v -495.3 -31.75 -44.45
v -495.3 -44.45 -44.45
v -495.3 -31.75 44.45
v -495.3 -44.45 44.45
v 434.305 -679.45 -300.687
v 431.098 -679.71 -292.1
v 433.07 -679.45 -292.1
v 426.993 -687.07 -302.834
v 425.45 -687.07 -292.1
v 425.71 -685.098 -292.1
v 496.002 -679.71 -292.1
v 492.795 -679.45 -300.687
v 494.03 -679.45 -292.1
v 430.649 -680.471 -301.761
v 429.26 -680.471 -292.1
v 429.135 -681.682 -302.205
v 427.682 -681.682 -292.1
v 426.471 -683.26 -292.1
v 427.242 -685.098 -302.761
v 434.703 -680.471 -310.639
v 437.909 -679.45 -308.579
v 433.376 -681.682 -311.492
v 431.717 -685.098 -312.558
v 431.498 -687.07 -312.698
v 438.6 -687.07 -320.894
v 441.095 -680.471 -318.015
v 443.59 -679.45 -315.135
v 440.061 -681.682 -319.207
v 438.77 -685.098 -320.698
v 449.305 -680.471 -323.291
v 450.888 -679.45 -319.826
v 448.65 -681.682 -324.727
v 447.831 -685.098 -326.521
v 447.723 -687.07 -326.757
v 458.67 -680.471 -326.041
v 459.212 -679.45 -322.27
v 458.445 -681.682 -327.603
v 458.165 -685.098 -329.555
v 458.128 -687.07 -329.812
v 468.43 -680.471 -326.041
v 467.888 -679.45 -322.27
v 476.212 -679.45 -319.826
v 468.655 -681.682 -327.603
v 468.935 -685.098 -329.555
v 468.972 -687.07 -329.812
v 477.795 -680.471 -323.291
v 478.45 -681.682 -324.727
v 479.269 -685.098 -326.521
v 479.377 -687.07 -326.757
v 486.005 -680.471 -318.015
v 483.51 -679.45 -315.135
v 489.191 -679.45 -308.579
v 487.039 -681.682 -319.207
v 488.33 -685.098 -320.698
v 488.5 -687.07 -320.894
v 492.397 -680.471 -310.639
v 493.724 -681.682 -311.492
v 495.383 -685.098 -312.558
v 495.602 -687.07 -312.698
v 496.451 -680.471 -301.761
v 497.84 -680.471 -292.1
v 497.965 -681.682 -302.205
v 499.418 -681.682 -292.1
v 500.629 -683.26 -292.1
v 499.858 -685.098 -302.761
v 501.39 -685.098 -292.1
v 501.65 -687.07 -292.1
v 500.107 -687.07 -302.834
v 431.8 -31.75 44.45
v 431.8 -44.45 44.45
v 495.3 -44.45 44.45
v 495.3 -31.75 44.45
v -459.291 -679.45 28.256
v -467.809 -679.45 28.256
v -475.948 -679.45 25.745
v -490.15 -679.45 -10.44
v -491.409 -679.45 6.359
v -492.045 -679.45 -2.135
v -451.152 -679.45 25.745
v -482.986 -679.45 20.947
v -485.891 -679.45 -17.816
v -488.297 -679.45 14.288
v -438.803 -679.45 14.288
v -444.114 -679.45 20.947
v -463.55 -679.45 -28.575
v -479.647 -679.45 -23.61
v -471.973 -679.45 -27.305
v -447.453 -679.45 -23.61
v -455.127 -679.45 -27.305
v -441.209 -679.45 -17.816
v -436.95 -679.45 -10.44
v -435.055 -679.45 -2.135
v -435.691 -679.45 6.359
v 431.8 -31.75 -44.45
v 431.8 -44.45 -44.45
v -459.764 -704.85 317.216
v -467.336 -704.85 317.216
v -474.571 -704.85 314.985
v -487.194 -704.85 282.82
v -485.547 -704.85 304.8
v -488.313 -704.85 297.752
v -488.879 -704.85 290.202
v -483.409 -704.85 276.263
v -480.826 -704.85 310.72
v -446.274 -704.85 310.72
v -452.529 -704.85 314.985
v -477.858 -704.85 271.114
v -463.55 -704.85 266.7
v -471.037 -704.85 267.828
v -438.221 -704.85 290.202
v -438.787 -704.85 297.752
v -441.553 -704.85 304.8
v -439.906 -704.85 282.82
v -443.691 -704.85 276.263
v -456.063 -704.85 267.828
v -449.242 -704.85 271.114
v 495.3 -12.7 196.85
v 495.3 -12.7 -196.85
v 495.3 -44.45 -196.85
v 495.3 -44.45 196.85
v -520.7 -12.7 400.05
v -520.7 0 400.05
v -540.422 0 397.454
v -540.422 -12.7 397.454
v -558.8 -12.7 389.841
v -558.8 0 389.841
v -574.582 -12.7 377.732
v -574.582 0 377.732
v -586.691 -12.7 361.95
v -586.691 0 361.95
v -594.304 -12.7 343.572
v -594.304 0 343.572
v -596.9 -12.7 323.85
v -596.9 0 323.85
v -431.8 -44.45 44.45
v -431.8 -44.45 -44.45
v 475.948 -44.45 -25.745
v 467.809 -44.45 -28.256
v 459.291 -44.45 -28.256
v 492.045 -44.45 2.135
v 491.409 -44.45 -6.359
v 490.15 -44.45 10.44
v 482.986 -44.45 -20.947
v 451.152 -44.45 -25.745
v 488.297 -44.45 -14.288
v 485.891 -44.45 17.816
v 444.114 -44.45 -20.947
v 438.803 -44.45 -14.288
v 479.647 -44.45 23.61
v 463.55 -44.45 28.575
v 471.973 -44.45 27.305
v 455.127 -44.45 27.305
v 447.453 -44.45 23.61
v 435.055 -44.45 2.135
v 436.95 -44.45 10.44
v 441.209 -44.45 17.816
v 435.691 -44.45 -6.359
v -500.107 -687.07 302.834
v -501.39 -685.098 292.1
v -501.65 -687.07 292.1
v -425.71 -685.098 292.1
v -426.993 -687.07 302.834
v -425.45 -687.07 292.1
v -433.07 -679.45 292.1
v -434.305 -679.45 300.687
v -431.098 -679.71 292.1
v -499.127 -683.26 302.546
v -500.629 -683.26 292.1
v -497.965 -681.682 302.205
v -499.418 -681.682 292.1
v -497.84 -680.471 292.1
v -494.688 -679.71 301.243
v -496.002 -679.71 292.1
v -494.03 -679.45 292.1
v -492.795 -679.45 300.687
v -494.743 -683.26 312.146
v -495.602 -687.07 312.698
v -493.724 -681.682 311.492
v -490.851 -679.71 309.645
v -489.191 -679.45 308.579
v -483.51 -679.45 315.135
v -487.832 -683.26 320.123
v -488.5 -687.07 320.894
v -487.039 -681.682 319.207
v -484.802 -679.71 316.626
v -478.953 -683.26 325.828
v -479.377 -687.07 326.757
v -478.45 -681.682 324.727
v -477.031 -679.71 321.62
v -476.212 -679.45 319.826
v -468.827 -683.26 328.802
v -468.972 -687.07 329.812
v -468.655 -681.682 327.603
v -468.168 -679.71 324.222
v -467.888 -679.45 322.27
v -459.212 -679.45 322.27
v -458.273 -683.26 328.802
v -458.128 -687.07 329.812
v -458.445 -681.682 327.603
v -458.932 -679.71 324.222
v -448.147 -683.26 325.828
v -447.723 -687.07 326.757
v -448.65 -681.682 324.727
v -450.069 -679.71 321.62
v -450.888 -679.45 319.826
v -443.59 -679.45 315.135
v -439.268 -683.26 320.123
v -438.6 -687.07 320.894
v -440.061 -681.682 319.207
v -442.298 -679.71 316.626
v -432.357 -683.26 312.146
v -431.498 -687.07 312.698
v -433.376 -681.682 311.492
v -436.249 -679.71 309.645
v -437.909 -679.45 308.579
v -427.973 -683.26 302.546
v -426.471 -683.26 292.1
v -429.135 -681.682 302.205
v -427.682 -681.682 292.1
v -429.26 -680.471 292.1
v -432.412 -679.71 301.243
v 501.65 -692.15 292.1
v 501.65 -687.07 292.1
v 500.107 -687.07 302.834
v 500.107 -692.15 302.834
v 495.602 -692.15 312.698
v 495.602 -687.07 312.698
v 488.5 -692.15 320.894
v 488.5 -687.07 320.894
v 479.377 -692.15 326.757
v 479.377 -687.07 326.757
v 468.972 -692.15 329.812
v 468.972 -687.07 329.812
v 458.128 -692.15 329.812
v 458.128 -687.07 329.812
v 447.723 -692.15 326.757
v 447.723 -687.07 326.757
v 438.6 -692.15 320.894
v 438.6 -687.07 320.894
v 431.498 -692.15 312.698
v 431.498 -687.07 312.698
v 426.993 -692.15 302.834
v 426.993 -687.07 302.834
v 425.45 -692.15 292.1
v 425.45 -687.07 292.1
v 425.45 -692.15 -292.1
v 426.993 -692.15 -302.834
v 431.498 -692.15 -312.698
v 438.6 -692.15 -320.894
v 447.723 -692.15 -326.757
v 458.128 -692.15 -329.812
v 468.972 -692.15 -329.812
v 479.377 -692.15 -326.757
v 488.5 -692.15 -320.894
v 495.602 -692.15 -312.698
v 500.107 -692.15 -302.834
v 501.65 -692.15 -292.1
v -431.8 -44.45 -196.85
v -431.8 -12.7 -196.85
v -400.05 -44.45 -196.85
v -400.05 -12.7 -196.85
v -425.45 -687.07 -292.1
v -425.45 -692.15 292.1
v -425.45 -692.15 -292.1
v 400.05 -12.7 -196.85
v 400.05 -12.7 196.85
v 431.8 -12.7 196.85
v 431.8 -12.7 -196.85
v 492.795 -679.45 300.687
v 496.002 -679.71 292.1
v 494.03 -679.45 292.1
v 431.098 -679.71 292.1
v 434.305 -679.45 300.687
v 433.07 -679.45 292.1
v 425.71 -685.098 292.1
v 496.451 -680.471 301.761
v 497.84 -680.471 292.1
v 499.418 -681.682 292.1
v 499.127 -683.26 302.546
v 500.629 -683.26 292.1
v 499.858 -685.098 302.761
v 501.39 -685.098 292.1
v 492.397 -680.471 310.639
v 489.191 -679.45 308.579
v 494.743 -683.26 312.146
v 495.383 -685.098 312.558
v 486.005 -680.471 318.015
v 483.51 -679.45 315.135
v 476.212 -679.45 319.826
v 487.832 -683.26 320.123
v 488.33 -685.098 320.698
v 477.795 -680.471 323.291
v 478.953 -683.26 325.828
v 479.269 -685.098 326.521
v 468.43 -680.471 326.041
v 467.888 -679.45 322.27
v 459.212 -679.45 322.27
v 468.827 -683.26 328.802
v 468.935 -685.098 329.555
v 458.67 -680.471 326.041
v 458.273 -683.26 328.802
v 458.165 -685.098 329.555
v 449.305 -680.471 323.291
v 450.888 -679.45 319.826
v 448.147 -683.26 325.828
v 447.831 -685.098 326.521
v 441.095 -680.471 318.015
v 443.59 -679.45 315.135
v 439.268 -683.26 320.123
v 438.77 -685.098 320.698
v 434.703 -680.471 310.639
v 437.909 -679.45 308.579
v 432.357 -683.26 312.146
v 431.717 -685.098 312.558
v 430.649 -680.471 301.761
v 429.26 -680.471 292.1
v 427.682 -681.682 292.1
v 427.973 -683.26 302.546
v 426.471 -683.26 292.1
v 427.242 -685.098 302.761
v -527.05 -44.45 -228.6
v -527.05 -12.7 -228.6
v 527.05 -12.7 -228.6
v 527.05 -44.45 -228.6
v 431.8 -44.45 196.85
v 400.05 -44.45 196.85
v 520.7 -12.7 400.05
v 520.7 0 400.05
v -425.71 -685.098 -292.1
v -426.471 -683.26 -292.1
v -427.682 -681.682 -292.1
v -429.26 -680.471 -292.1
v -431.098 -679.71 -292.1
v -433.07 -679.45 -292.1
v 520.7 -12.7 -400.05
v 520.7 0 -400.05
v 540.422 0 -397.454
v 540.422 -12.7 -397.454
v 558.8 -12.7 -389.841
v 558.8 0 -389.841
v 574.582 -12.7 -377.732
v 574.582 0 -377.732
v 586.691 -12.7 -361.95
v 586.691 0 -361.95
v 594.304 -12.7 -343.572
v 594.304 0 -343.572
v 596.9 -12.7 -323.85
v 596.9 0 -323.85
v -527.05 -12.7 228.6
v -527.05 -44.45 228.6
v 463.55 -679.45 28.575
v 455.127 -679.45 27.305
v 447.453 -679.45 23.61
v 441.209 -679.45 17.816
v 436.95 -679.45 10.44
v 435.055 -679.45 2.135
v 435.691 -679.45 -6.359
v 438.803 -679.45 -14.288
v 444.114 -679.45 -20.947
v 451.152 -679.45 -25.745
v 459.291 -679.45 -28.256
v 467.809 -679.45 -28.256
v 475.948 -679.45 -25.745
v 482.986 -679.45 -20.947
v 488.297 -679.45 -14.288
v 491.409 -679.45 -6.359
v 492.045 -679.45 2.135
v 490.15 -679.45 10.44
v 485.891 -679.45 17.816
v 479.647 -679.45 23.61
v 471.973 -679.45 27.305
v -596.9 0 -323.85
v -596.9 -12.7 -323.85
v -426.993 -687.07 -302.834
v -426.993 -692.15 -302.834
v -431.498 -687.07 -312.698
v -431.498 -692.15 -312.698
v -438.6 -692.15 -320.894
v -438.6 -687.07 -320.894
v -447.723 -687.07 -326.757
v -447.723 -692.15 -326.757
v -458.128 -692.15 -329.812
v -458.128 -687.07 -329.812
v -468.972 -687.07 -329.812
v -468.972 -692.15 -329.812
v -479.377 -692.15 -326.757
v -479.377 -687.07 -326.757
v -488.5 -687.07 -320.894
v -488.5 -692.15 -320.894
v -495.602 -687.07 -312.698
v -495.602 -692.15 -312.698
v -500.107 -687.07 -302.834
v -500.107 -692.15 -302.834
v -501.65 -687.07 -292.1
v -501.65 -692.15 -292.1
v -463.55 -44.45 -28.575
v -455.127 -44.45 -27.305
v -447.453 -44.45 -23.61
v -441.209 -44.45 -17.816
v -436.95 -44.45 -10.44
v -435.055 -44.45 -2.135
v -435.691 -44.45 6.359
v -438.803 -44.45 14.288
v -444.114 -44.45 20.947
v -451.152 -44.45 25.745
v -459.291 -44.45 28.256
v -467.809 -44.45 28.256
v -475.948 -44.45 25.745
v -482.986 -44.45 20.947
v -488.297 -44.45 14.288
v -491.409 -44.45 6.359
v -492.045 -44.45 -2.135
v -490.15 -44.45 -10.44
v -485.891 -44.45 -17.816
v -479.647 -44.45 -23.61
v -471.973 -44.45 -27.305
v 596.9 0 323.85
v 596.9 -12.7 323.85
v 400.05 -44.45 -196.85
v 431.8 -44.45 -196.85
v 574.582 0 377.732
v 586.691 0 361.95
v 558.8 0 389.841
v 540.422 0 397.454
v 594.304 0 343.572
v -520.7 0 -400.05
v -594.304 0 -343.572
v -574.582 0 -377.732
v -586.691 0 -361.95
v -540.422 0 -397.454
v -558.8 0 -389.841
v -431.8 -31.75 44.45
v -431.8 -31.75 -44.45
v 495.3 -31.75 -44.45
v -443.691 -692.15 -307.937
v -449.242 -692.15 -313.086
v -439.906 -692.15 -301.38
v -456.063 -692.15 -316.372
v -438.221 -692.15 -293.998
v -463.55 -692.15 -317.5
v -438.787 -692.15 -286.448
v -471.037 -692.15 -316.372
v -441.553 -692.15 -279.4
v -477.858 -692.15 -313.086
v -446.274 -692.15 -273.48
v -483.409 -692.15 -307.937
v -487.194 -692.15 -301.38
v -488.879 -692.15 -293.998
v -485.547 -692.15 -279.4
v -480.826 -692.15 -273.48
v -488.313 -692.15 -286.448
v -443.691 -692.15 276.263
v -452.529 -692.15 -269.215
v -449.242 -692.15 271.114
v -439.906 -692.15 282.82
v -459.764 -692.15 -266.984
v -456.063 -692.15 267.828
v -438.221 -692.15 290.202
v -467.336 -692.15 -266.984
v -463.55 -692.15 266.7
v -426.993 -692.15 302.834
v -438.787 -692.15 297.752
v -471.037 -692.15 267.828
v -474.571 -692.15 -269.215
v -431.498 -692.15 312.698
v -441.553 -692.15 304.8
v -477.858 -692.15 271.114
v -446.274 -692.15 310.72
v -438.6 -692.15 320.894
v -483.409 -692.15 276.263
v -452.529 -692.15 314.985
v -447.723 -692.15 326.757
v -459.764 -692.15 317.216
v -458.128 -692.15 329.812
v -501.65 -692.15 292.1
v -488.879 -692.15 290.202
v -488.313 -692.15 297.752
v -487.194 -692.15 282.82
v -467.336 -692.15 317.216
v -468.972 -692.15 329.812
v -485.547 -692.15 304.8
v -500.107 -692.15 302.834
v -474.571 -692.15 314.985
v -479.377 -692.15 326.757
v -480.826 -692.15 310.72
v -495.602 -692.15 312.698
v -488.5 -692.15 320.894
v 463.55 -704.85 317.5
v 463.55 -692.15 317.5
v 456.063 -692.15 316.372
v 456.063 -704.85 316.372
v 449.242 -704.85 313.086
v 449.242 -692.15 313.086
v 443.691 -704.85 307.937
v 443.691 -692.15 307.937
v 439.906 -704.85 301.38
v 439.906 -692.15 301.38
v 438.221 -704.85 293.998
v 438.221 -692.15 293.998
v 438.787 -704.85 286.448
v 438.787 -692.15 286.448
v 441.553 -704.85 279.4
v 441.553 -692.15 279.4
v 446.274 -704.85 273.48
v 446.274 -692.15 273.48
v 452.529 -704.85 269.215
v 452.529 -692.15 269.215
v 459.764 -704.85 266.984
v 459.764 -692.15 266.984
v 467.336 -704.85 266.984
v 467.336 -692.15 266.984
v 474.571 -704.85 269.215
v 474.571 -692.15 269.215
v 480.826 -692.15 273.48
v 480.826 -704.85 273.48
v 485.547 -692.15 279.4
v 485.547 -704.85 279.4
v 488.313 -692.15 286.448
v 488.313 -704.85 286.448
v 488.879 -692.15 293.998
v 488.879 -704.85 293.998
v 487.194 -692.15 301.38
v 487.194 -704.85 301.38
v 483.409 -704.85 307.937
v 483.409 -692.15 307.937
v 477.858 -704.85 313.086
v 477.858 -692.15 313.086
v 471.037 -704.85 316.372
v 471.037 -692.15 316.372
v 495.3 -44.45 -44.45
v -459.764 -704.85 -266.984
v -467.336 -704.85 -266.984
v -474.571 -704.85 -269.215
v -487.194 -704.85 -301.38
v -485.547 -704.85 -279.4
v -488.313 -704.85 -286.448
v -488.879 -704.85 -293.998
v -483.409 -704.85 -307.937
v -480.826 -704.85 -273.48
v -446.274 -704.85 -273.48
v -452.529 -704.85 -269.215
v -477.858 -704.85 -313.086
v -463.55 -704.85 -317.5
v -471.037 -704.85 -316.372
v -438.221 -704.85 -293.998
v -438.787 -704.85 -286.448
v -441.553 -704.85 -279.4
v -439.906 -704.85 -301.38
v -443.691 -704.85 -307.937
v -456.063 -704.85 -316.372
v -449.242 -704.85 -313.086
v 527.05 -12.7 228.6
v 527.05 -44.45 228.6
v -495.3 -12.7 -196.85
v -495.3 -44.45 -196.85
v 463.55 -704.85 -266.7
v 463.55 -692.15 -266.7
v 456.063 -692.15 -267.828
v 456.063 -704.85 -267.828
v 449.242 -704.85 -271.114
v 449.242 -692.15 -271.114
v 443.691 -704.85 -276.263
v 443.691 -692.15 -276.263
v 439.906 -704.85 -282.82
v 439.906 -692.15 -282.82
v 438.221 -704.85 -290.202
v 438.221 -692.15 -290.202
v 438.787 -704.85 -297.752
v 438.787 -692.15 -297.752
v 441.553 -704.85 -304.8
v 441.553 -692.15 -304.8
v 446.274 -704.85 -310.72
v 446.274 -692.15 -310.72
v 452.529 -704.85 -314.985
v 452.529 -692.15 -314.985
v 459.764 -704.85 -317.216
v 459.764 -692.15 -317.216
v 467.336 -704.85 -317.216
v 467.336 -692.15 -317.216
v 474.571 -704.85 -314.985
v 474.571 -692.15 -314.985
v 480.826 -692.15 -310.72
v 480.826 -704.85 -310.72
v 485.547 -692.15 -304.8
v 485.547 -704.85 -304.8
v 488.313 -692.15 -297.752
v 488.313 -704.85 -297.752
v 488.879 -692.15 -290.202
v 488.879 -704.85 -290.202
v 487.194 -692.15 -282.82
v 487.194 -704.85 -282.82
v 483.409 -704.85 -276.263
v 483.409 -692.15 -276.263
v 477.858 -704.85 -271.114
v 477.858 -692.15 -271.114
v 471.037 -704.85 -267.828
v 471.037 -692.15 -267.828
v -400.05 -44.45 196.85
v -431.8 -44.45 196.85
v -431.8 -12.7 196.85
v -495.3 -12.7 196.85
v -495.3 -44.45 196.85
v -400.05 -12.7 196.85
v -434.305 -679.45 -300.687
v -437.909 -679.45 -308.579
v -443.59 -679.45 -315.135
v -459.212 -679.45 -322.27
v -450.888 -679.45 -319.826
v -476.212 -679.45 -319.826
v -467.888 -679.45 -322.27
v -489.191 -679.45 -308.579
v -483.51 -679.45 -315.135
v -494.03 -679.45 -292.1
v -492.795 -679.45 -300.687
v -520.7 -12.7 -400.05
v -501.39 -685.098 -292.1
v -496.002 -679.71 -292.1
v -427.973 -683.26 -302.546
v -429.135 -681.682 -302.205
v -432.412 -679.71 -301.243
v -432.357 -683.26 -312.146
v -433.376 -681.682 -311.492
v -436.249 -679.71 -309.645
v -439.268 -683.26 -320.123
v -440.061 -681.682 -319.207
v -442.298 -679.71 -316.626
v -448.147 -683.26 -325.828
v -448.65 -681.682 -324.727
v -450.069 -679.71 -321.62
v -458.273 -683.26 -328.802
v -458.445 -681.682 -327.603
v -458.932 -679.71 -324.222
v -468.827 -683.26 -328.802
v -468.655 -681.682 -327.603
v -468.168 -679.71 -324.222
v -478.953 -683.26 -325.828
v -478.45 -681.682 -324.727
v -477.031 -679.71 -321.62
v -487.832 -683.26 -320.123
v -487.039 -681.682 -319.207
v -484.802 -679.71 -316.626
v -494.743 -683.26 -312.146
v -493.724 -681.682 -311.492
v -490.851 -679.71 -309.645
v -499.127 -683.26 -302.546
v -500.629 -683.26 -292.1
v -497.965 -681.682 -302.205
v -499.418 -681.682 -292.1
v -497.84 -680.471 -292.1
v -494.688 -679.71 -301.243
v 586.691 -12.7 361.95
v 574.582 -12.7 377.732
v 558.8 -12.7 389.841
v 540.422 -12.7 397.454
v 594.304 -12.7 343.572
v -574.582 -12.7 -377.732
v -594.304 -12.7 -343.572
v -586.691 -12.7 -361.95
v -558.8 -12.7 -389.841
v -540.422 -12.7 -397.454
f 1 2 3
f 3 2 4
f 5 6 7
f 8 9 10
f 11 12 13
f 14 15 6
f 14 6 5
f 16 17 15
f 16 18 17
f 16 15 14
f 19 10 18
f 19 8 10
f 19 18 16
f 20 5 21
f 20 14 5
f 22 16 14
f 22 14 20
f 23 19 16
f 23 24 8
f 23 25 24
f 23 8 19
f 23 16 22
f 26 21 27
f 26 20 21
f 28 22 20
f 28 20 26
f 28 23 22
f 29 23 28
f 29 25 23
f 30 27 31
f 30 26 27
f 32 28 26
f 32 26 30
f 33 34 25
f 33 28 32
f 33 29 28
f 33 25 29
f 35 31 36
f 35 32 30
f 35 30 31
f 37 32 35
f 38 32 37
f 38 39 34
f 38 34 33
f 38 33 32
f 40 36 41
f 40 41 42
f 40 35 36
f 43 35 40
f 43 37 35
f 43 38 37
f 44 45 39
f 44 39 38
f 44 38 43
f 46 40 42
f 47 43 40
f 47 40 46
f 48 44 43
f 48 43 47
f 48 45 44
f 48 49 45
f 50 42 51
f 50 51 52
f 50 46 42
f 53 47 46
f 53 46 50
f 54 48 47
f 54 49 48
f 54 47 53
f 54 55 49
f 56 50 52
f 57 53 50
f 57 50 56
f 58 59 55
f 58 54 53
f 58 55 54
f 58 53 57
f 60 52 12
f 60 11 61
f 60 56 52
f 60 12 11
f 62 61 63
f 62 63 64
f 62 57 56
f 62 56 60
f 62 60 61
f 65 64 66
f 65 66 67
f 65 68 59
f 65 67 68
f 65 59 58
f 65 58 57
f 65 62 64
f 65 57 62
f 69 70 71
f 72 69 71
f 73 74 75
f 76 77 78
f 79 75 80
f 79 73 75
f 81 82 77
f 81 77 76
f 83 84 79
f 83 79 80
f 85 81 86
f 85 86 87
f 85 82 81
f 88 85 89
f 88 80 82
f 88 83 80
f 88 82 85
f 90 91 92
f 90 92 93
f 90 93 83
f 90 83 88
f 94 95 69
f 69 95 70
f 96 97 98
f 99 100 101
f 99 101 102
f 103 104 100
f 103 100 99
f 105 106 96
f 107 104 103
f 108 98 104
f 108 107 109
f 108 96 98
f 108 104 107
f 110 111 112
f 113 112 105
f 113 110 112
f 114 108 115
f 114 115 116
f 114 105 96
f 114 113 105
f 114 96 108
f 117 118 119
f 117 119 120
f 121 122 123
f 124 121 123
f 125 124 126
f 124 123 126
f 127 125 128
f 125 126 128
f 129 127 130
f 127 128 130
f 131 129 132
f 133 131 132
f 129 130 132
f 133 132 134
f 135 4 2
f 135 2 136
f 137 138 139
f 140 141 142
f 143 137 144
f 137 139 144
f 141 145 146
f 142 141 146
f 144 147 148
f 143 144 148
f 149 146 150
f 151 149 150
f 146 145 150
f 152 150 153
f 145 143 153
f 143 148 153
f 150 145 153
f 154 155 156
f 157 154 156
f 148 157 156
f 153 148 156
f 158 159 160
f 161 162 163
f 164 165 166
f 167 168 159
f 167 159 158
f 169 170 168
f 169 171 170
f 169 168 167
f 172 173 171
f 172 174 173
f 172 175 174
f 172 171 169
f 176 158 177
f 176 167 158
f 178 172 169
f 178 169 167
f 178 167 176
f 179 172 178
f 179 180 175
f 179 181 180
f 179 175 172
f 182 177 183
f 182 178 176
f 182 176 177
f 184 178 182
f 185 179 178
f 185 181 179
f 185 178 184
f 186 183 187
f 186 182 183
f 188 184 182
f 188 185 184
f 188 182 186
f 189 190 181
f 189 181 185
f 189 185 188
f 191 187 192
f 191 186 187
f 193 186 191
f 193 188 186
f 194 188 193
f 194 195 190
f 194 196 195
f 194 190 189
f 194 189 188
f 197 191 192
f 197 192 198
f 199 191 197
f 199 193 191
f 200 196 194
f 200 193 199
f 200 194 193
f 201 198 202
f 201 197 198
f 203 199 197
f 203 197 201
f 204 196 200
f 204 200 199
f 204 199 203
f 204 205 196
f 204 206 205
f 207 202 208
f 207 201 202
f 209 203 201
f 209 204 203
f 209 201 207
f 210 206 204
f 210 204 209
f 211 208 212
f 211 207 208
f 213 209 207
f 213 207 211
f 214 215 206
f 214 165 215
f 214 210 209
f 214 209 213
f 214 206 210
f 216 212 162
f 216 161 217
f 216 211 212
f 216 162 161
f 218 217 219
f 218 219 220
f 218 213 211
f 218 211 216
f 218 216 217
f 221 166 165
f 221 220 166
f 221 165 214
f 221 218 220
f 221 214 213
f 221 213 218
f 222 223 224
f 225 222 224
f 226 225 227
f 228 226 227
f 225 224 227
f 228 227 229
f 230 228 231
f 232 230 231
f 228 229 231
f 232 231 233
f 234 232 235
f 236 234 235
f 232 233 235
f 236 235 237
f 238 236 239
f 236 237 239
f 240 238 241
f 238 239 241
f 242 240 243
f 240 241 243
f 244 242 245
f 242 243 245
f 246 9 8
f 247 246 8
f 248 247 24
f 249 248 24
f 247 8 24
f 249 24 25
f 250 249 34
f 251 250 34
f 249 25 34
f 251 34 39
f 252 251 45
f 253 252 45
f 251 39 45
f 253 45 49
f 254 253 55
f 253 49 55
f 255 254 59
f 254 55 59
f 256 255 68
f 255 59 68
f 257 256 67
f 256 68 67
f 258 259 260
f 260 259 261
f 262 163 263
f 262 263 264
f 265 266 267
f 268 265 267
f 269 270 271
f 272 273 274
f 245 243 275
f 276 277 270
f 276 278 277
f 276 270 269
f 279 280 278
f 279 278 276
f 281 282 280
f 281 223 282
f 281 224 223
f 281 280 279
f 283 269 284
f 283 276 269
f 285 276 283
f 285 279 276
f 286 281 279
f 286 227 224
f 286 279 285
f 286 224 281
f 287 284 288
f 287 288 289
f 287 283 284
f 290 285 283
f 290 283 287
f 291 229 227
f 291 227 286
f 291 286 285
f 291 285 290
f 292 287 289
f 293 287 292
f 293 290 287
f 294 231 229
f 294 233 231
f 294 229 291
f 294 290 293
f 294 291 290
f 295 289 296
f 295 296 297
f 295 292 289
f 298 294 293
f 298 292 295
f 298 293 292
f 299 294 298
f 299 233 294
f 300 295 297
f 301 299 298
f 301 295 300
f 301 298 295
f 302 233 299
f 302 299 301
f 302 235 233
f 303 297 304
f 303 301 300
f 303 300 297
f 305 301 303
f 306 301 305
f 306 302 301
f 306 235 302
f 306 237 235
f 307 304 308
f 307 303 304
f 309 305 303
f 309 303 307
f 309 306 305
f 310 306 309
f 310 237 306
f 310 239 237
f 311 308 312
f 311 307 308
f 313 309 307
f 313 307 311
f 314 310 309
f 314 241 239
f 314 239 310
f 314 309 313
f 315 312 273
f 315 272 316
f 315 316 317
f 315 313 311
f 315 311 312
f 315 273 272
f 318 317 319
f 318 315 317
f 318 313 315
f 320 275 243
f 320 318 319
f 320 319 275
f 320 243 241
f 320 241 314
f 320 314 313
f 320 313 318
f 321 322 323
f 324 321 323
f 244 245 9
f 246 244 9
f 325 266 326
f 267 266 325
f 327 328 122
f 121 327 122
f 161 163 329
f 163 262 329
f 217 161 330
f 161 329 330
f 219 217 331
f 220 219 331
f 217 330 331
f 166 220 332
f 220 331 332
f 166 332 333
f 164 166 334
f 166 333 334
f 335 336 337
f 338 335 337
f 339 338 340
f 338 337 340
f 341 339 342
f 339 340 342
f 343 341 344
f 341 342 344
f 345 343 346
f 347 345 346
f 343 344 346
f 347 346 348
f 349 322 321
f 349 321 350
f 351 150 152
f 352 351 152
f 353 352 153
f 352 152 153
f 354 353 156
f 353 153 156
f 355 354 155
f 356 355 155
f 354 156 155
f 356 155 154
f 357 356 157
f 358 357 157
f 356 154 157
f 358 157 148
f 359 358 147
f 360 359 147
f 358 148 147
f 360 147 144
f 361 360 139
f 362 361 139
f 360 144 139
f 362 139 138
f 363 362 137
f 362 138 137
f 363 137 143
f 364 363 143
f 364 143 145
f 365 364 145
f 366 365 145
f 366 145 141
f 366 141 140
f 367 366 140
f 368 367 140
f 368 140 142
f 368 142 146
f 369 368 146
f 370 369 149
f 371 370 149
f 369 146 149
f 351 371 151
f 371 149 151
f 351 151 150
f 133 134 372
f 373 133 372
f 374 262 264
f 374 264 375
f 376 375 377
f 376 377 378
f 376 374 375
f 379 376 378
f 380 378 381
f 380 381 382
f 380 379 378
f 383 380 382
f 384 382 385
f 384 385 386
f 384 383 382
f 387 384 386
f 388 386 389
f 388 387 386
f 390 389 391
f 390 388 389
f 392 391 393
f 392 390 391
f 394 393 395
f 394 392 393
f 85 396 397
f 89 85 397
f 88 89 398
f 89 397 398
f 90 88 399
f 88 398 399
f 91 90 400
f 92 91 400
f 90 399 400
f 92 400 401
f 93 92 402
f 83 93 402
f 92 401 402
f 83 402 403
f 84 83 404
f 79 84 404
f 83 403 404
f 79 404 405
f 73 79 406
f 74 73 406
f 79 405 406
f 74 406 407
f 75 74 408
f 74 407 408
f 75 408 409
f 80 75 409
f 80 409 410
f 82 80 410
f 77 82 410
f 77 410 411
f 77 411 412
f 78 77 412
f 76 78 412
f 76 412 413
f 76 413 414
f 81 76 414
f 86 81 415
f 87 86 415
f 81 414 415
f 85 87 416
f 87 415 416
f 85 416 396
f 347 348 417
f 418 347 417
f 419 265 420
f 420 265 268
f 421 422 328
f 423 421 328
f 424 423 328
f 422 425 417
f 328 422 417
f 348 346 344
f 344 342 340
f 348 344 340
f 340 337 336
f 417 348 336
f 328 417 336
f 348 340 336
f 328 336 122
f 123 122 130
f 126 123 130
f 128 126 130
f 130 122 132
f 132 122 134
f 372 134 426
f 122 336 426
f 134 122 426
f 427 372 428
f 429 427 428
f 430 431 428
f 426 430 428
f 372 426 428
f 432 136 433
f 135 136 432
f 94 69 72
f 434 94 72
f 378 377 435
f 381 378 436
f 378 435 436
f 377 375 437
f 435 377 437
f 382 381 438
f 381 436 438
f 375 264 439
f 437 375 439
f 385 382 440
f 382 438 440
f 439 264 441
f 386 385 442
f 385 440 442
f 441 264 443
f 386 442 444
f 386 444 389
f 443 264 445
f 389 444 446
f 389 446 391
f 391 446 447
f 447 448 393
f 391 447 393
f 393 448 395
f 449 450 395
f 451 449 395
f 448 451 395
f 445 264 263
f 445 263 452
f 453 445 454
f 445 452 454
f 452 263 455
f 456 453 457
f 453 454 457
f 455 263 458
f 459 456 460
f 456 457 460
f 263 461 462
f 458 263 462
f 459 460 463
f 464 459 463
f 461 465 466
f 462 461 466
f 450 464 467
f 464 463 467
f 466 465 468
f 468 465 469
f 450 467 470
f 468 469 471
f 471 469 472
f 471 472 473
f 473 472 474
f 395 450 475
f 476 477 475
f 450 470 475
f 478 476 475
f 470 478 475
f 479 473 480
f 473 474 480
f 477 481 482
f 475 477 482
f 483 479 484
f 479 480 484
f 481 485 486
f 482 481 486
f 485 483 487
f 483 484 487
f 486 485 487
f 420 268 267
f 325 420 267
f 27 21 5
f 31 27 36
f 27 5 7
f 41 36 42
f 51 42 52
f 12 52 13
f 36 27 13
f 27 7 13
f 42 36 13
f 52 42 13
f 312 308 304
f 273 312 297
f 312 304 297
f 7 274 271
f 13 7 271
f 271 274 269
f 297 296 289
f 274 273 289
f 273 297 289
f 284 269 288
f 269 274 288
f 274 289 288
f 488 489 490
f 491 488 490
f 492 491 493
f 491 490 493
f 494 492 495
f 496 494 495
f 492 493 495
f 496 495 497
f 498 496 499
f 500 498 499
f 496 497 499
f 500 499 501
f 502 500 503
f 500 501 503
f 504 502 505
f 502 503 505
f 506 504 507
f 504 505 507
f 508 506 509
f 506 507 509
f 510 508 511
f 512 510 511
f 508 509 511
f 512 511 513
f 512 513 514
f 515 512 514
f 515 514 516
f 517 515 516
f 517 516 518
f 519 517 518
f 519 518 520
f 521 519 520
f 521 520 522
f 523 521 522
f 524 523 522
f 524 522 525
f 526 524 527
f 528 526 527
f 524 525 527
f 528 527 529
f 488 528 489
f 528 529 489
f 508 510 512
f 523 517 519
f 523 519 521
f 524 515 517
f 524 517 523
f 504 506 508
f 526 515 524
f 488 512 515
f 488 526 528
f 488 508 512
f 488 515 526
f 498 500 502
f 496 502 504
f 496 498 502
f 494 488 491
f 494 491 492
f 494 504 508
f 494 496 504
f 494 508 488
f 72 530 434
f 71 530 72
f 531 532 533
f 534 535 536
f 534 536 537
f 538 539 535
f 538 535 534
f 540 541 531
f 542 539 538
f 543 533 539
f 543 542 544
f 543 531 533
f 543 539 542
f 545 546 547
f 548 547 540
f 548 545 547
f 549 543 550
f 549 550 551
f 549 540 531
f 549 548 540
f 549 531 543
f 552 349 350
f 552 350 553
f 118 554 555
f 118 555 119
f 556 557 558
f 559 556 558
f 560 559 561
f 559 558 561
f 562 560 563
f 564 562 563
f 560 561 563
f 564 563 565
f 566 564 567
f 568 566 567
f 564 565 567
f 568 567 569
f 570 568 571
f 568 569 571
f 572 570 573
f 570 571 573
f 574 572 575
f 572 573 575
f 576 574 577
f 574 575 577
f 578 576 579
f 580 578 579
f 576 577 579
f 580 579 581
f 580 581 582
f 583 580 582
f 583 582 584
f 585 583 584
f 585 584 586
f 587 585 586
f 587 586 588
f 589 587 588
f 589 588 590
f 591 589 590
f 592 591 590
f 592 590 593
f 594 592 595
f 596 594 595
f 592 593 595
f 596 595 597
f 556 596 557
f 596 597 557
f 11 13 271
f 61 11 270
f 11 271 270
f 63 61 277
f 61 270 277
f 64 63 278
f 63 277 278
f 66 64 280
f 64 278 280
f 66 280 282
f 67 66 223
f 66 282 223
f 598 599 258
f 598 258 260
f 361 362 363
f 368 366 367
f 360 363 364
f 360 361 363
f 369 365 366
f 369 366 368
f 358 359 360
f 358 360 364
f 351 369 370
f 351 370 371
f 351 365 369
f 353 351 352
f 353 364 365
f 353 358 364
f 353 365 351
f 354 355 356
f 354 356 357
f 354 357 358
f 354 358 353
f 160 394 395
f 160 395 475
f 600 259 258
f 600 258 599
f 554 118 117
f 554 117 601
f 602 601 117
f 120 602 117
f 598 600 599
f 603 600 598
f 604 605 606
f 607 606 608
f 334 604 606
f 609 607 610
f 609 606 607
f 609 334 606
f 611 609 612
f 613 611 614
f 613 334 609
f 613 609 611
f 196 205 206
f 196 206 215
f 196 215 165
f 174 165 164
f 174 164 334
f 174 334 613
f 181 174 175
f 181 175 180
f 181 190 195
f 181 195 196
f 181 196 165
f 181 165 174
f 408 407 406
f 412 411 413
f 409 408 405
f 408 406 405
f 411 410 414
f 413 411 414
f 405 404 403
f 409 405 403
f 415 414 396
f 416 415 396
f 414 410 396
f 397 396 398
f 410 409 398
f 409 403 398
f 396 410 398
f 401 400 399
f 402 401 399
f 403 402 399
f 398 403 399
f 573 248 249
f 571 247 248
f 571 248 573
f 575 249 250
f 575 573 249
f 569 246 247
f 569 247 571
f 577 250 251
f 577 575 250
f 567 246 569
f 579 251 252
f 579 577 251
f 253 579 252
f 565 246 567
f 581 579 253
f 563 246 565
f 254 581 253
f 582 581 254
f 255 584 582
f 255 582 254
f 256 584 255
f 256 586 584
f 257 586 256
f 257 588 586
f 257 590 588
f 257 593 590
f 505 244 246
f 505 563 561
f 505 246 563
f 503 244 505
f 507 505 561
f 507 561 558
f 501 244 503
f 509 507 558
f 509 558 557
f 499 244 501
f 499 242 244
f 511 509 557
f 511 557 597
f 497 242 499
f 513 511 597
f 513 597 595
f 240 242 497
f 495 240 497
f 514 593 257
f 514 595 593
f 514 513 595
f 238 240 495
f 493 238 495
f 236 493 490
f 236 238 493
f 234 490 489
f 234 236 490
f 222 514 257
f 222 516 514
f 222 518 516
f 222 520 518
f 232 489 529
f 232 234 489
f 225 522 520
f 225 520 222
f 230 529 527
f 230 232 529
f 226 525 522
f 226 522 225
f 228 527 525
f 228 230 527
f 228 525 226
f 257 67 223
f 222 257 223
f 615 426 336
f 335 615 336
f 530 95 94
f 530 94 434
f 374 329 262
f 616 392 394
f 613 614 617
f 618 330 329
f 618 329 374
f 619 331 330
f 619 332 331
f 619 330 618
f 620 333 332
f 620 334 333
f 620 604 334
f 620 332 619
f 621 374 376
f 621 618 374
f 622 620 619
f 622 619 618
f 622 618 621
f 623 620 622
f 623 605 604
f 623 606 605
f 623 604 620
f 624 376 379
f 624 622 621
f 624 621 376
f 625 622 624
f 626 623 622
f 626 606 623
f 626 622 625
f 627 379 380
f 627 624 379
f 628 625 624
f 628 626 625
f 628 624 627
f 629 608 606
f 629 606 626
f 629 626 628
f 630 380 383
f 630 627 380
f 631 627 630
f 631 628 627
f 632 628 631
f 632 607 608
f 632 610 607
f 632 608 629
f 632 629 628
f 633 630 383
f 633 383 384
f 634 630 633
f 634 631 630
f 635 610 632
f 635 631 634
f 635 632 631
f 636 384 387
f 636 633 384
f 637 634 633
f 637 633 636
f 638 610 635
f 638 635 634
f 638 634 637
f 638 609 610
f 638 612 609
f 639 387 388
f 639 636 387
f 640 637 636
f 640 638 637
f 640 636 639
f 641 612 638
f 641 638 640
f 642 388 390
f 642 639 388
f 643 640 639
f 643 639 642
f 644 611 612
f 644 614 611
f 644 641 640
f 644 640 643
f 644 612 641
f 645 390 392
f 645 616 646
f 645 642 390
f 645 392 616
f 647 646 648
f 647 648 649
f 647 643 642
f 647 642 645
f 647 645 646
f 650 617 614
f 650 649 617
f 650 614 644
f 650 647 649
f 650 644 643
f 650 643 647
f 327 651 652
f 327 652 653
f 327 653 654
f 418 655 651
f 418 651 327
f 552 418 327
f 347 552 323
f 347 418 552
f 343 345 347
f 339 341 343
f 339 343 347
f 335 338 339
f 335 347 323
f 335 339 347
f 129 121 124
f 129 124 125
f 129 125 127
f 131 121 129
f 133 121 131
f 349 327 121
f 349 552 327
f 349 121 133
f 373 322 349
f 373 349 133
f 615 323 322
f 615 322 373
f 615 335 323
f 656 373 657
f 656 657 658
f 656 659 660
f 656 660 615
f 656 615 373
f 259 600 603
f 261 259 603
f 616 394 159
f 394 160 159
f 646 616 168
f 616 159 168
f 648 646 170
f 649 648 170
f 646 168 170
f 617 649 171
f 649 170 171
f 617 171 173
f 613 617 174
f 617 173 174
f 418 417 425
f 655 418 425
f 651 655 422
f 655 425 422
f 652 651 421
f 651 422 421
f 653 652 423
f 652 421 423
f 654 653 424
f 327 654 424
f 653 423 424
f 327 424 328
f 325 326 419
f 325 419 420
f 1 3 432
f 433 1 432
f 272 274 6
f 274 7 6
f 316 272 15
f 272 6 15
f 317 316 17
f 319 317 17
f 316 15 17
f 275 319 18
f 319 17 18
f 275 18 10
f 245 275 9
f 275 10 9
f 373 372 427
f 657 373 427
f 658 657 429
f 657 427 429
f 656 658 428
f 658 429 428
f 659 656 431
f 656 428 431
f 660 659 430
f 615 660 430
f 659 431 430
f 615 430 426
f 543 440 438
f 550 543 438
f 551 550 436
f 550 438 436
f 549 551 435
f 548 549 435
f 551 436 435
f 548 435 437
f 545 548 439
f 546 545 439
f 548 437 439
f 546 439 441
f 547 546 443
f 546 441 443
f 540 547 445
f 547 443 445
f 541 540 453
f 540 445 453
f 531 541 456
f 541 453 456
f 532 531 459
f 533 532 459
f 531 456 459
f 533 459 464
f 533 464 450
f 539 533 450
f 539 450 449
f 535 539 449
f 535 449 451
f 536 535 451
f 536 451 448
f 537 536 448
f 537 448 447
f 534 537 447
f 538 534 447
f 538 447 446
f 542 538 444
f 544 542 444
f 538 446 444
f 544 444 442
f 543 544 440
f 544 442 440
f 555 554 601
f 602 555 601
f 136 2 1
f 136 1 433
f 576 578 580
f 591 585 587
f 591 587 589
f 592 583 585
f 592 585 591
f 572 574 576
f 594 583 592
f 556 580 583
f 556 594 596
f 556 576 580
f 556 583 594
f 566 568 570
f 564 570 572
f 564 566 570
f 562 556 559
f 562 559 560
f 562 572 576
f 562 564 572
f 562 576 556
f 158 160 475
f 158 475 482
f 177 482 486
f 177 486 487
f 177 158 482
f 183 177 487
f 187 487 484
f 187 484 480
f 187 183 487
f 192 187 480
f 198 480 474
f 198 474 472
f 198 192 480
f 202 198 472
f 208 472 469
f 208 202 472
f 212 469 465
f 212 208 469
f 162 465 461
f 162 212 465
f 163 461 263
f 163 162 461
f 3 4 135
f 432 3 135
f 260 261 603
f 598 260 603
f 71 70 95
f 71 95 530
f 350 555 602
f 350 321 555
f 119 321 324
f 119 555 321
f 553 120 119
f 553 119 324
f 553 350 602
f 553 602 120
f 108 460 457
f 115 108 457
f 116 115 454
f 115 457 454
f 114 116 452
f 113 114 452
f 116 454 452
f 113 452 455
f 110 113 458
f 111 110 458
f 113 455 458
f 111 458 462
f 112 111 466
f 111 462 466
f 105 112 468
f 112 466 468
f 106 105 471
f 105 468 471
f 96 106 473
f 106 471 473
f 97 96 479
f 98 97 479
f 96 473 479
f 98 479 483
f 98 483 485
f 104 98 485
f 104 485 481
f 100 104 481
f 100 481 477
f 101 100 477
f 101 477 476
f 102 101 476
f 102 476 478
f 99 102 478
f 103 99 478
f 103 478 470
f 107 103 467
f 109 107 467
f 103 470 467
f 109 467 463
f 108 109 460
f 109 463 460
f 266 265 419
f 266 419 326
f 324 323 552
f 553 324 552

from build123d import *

# Parameters (mm, degrees)
BOSS_EXTRUDE1_DEPTH   = 12.7
SKETCH2_W             = 1054.1
SKETCH2_H             = 457.2
SKETCH2_W_2           = 990.6
SKETCH2_H_2           = 393.7
EXTRUDE_THIN1_DEPTH   = 31.75
SKETCH3_W             = 31.75
SKETCH3_H             = 393.7
BOSS_EXTRUDE2_DEPTH   = 31.75
BOSS_EXTRUDE2_2_DEPTH = 31.75
SKETCH4_W             = 63.5
SKETCH4_H             = 88.9
BOSS_EXTRUDE3_DEPTH   = 12.7
BOSS_EXTRUDE3_2_DEPTH = 12.7
SKETCH5_R             = 28.575
BOSS_EXTRUDE4_DEPTH   = 635
BOSS_EXTRUDE4_2_DEPTH = 635
BOSS_EXTRUDE5_DEPTH   = 12.7
BOSS_EXTRUDE5_2_DEPTH = 12.7
SKETCH7_R             = 25.4
BOSS_EXTRUDE6_DEPTH   = 12.7
FILLET1_R             = 7.62
FILLET2_R             = 7.62


with BuildPart() as part:
    # Sketch1 → Boss-Extrude1 (new body)
    with BuildSketch(Plane(origin=(0, 0, 0), x_dir=(1, 0, 0), z_dir=(0, 1, 0))):
        with BuildLine():
            Line((-520.7, 400.05), (520.7, 400.05))
            ThreePointArc((520.7, 400.05), (574.581536726, 377.731536726), (596.9, 323.85))
            Line((596.9, 323.85), (596.9, -323.85))
            ThreePointArc((596.9, -323.85), (574.581536726, -377.731536726), (520.7, -400.05))
            Line((520.7, -400.05), (-520.7, -400.05))
            ThreePointArc((-520.7, -400.05), (-574.581536726, -377.731536726), (-596.9, -323.85))
            Line((-596.9, -323.85), (-596.9, 323.85))
            ThreePointArc((-596.9, 323.85), (-574.581536726, 377.731536726), (-520.7, 400.05))
        make_face()
    extrude(amount=-BOSS_EXTRUDE1_DEPTH)

    # Sketch2 → Extrude-Thin1 (add)
    with BuildSketch(Plane.XZ.offset(12.7)):
        Rectangle(SKETCH2_W, SKETCH2_H)
        Rectangle(SKETCH2_W_2, SKETCH2_H_2, mode=Mode.SUBTRACT)
    extrude(amount=EXTRUDE_THIN1_DEPTH)


with BuildPart() as body_2:
    # Sketch3 → Boss-Extrude2 (new body)
    with BuildSketch(Plane.XZ.offset(12.7)):
        with Locations((-415.925, 0)):
            Rectangle(SKETCH3_W, SKETCH3_H)
    extrude(amount=BOSS_EXTRUDE2_DEPTH)


with BuildPart() as body_3:
    # Sketch3 → Boss-Extrude2 2 (new body)
    with BuildSketch(Plane.XZ.offset(12.7)):
        with Locations((415.925, 0)):
            Rectangle(SKETCH3_W, SKETCH3_H)
    extrude(amount=BOSS_EXTRUDE2_2_DEPTH)


with BuildPart() as body_4:
    # Sketch4 → Boss-Extrude3 (new body)
    with BuildSketch(Plane.XZ.offset(44.45)):
        with Locations((-463.55, 0)):
            Rectangle(SKETCH4_W, SKETCH4_H)
    extrude(amount=-BOSS_EXTRUDE3_DEPTH)


with BuildPart() as body_5:
    # Sketch4 → Boss-Extrude3 2 (new body)
    with BuildSketch(Plane.XZ.offset(44.45)):
        with Locations((463.55, 0)):
            Rectangle(SKETCH4_W, SKETCH4_H)
    extrude(amount=-BOSS_EXTRUDE3_2_DEPTH)


with BuildPart() as body_6:
    # Sketch5 → Boss-Extrude4 (new body)
    with BuildSketch(Plane.XZ.offset(44.45)):
        with Locations(Location((-463.55, 0, 0), (0, 0, 270))):  # turned: the seam where the file's is
            Circle(SKETCH5_R)
    extrude(amount=BOSS_EXTRUDE4_DEPTH)


with BuildPart() as body_7:
    # Sketch5 → Boss-Extrude4 2 (new body)
    with BuildSketch(Plane.XZ.offset(44.45)):
        with Locations(Location((463.55, 0, 0), (0, 0, 90))):  # turned: the seam where the file's is
            Circle(SKETCH5_R)
    extrude(amount=BOSS_EXTRUDE4_2_DEPTH)


with BuildPart() as body_8:
    # Sketch6 → Boss-Extrude5 (new body)
    with BuildSketch(Plane.XZ.offset(679.45)):
        with BuildLine():
            Line((-501.65, -292.1), (-501.65, 292.1))
            ThreePointArc((-501.65, 292.1), (-463.55, 330.2), (-425.45, 292.1))
            Line((-425.45, 292.1), (-425.45, -292.1))
            ThreePointArc((-425.45, -292.1), (-463.55, -330.2), (-501.65, -292.1))
        make_face()
    extrude(amount=BOSS_EXTRUDE5_DEPTH)



with BuildPart() as body_9:
    # Sketch6 → Boss-Extrude5 2 (new body)
    with BuildSketch(Plane.XZ.offset(679.45)):
        with BuildLine():
            Line((501.65, -292.1), (501.65, 292.1))
            ThreePointArc((501.65, 292.1), (463.55, 330.2), (425.45, 292.1))
            Line((425.45, 292.1), (425.45, -292.1))
            ThreePointArc((425.45, -292.1), (463.55, -330.2), (501.65, -292.1))
        make_face()
    extrude(amount=BOSS_EXTRUDE5_2_DEPTH)


with BuildPart() as body_8_1:
    add(body_8.part)

    add(body_9.part)  # Boss-Extrude6 merges body 9
    # Sketch7 → Boss-Extrude6 (add)
    with BuildSketch(Plane.XZ.offset(692.15)):
        with Locations(Location((-463.55, 292.1, 0), (0, 0, 270))):  # turned: the seam where the file's is
            Circle(SKETCH7_R)
        with Locations(Location((-463.55, -292.1, 0), (0, 0, 270))):  # turned: the seam where the file's is
            Circle(SKETCH7_R)
        with Locations(Location((463.55, -292.1, 0), (0, 0, 90))):  # turned: the seam where the file's is
            Circle(SKETCH7_R)
        with Locations(Location((463.55, 292.1, 0), (0, 0, 90))):  # turned: the seam where the file's is
            Circle(SKETCH7_R)
    extrude(amount=BOSS_EXTRUDE6_DEPTH)

    # Fillet1
    fillet1_edges = [body_8_1.edges().sort_by_distance(p)[0] for p in [
        (-501.65, -679.45, 0),
        (-463.55, -679.45, 330.2),
        (-425.45, -679.45, 0),
        (-463.55, -679.45, -330.2),
    ]]
    fillet(fillet1_edges, radius=FILLET1_R)

    # Fillet2
    fillet2_edges = [body_8_1.edges().sort_by_distance(p)[0] for p in [
        (425.45, -679.45, 0),
        (463.55, -679.45, 330.2),
        (501.65, -679.45, 0),
        (463.55, -679.45, -330.2),
    ]]
    fillet(fillet2_edges, radius=FILLET2_R)


solid = Compound([part.part, body_2.part, body_3.part, body_4.part, body_5.part, body_6.part, body_7.part, body_8_1.part])
